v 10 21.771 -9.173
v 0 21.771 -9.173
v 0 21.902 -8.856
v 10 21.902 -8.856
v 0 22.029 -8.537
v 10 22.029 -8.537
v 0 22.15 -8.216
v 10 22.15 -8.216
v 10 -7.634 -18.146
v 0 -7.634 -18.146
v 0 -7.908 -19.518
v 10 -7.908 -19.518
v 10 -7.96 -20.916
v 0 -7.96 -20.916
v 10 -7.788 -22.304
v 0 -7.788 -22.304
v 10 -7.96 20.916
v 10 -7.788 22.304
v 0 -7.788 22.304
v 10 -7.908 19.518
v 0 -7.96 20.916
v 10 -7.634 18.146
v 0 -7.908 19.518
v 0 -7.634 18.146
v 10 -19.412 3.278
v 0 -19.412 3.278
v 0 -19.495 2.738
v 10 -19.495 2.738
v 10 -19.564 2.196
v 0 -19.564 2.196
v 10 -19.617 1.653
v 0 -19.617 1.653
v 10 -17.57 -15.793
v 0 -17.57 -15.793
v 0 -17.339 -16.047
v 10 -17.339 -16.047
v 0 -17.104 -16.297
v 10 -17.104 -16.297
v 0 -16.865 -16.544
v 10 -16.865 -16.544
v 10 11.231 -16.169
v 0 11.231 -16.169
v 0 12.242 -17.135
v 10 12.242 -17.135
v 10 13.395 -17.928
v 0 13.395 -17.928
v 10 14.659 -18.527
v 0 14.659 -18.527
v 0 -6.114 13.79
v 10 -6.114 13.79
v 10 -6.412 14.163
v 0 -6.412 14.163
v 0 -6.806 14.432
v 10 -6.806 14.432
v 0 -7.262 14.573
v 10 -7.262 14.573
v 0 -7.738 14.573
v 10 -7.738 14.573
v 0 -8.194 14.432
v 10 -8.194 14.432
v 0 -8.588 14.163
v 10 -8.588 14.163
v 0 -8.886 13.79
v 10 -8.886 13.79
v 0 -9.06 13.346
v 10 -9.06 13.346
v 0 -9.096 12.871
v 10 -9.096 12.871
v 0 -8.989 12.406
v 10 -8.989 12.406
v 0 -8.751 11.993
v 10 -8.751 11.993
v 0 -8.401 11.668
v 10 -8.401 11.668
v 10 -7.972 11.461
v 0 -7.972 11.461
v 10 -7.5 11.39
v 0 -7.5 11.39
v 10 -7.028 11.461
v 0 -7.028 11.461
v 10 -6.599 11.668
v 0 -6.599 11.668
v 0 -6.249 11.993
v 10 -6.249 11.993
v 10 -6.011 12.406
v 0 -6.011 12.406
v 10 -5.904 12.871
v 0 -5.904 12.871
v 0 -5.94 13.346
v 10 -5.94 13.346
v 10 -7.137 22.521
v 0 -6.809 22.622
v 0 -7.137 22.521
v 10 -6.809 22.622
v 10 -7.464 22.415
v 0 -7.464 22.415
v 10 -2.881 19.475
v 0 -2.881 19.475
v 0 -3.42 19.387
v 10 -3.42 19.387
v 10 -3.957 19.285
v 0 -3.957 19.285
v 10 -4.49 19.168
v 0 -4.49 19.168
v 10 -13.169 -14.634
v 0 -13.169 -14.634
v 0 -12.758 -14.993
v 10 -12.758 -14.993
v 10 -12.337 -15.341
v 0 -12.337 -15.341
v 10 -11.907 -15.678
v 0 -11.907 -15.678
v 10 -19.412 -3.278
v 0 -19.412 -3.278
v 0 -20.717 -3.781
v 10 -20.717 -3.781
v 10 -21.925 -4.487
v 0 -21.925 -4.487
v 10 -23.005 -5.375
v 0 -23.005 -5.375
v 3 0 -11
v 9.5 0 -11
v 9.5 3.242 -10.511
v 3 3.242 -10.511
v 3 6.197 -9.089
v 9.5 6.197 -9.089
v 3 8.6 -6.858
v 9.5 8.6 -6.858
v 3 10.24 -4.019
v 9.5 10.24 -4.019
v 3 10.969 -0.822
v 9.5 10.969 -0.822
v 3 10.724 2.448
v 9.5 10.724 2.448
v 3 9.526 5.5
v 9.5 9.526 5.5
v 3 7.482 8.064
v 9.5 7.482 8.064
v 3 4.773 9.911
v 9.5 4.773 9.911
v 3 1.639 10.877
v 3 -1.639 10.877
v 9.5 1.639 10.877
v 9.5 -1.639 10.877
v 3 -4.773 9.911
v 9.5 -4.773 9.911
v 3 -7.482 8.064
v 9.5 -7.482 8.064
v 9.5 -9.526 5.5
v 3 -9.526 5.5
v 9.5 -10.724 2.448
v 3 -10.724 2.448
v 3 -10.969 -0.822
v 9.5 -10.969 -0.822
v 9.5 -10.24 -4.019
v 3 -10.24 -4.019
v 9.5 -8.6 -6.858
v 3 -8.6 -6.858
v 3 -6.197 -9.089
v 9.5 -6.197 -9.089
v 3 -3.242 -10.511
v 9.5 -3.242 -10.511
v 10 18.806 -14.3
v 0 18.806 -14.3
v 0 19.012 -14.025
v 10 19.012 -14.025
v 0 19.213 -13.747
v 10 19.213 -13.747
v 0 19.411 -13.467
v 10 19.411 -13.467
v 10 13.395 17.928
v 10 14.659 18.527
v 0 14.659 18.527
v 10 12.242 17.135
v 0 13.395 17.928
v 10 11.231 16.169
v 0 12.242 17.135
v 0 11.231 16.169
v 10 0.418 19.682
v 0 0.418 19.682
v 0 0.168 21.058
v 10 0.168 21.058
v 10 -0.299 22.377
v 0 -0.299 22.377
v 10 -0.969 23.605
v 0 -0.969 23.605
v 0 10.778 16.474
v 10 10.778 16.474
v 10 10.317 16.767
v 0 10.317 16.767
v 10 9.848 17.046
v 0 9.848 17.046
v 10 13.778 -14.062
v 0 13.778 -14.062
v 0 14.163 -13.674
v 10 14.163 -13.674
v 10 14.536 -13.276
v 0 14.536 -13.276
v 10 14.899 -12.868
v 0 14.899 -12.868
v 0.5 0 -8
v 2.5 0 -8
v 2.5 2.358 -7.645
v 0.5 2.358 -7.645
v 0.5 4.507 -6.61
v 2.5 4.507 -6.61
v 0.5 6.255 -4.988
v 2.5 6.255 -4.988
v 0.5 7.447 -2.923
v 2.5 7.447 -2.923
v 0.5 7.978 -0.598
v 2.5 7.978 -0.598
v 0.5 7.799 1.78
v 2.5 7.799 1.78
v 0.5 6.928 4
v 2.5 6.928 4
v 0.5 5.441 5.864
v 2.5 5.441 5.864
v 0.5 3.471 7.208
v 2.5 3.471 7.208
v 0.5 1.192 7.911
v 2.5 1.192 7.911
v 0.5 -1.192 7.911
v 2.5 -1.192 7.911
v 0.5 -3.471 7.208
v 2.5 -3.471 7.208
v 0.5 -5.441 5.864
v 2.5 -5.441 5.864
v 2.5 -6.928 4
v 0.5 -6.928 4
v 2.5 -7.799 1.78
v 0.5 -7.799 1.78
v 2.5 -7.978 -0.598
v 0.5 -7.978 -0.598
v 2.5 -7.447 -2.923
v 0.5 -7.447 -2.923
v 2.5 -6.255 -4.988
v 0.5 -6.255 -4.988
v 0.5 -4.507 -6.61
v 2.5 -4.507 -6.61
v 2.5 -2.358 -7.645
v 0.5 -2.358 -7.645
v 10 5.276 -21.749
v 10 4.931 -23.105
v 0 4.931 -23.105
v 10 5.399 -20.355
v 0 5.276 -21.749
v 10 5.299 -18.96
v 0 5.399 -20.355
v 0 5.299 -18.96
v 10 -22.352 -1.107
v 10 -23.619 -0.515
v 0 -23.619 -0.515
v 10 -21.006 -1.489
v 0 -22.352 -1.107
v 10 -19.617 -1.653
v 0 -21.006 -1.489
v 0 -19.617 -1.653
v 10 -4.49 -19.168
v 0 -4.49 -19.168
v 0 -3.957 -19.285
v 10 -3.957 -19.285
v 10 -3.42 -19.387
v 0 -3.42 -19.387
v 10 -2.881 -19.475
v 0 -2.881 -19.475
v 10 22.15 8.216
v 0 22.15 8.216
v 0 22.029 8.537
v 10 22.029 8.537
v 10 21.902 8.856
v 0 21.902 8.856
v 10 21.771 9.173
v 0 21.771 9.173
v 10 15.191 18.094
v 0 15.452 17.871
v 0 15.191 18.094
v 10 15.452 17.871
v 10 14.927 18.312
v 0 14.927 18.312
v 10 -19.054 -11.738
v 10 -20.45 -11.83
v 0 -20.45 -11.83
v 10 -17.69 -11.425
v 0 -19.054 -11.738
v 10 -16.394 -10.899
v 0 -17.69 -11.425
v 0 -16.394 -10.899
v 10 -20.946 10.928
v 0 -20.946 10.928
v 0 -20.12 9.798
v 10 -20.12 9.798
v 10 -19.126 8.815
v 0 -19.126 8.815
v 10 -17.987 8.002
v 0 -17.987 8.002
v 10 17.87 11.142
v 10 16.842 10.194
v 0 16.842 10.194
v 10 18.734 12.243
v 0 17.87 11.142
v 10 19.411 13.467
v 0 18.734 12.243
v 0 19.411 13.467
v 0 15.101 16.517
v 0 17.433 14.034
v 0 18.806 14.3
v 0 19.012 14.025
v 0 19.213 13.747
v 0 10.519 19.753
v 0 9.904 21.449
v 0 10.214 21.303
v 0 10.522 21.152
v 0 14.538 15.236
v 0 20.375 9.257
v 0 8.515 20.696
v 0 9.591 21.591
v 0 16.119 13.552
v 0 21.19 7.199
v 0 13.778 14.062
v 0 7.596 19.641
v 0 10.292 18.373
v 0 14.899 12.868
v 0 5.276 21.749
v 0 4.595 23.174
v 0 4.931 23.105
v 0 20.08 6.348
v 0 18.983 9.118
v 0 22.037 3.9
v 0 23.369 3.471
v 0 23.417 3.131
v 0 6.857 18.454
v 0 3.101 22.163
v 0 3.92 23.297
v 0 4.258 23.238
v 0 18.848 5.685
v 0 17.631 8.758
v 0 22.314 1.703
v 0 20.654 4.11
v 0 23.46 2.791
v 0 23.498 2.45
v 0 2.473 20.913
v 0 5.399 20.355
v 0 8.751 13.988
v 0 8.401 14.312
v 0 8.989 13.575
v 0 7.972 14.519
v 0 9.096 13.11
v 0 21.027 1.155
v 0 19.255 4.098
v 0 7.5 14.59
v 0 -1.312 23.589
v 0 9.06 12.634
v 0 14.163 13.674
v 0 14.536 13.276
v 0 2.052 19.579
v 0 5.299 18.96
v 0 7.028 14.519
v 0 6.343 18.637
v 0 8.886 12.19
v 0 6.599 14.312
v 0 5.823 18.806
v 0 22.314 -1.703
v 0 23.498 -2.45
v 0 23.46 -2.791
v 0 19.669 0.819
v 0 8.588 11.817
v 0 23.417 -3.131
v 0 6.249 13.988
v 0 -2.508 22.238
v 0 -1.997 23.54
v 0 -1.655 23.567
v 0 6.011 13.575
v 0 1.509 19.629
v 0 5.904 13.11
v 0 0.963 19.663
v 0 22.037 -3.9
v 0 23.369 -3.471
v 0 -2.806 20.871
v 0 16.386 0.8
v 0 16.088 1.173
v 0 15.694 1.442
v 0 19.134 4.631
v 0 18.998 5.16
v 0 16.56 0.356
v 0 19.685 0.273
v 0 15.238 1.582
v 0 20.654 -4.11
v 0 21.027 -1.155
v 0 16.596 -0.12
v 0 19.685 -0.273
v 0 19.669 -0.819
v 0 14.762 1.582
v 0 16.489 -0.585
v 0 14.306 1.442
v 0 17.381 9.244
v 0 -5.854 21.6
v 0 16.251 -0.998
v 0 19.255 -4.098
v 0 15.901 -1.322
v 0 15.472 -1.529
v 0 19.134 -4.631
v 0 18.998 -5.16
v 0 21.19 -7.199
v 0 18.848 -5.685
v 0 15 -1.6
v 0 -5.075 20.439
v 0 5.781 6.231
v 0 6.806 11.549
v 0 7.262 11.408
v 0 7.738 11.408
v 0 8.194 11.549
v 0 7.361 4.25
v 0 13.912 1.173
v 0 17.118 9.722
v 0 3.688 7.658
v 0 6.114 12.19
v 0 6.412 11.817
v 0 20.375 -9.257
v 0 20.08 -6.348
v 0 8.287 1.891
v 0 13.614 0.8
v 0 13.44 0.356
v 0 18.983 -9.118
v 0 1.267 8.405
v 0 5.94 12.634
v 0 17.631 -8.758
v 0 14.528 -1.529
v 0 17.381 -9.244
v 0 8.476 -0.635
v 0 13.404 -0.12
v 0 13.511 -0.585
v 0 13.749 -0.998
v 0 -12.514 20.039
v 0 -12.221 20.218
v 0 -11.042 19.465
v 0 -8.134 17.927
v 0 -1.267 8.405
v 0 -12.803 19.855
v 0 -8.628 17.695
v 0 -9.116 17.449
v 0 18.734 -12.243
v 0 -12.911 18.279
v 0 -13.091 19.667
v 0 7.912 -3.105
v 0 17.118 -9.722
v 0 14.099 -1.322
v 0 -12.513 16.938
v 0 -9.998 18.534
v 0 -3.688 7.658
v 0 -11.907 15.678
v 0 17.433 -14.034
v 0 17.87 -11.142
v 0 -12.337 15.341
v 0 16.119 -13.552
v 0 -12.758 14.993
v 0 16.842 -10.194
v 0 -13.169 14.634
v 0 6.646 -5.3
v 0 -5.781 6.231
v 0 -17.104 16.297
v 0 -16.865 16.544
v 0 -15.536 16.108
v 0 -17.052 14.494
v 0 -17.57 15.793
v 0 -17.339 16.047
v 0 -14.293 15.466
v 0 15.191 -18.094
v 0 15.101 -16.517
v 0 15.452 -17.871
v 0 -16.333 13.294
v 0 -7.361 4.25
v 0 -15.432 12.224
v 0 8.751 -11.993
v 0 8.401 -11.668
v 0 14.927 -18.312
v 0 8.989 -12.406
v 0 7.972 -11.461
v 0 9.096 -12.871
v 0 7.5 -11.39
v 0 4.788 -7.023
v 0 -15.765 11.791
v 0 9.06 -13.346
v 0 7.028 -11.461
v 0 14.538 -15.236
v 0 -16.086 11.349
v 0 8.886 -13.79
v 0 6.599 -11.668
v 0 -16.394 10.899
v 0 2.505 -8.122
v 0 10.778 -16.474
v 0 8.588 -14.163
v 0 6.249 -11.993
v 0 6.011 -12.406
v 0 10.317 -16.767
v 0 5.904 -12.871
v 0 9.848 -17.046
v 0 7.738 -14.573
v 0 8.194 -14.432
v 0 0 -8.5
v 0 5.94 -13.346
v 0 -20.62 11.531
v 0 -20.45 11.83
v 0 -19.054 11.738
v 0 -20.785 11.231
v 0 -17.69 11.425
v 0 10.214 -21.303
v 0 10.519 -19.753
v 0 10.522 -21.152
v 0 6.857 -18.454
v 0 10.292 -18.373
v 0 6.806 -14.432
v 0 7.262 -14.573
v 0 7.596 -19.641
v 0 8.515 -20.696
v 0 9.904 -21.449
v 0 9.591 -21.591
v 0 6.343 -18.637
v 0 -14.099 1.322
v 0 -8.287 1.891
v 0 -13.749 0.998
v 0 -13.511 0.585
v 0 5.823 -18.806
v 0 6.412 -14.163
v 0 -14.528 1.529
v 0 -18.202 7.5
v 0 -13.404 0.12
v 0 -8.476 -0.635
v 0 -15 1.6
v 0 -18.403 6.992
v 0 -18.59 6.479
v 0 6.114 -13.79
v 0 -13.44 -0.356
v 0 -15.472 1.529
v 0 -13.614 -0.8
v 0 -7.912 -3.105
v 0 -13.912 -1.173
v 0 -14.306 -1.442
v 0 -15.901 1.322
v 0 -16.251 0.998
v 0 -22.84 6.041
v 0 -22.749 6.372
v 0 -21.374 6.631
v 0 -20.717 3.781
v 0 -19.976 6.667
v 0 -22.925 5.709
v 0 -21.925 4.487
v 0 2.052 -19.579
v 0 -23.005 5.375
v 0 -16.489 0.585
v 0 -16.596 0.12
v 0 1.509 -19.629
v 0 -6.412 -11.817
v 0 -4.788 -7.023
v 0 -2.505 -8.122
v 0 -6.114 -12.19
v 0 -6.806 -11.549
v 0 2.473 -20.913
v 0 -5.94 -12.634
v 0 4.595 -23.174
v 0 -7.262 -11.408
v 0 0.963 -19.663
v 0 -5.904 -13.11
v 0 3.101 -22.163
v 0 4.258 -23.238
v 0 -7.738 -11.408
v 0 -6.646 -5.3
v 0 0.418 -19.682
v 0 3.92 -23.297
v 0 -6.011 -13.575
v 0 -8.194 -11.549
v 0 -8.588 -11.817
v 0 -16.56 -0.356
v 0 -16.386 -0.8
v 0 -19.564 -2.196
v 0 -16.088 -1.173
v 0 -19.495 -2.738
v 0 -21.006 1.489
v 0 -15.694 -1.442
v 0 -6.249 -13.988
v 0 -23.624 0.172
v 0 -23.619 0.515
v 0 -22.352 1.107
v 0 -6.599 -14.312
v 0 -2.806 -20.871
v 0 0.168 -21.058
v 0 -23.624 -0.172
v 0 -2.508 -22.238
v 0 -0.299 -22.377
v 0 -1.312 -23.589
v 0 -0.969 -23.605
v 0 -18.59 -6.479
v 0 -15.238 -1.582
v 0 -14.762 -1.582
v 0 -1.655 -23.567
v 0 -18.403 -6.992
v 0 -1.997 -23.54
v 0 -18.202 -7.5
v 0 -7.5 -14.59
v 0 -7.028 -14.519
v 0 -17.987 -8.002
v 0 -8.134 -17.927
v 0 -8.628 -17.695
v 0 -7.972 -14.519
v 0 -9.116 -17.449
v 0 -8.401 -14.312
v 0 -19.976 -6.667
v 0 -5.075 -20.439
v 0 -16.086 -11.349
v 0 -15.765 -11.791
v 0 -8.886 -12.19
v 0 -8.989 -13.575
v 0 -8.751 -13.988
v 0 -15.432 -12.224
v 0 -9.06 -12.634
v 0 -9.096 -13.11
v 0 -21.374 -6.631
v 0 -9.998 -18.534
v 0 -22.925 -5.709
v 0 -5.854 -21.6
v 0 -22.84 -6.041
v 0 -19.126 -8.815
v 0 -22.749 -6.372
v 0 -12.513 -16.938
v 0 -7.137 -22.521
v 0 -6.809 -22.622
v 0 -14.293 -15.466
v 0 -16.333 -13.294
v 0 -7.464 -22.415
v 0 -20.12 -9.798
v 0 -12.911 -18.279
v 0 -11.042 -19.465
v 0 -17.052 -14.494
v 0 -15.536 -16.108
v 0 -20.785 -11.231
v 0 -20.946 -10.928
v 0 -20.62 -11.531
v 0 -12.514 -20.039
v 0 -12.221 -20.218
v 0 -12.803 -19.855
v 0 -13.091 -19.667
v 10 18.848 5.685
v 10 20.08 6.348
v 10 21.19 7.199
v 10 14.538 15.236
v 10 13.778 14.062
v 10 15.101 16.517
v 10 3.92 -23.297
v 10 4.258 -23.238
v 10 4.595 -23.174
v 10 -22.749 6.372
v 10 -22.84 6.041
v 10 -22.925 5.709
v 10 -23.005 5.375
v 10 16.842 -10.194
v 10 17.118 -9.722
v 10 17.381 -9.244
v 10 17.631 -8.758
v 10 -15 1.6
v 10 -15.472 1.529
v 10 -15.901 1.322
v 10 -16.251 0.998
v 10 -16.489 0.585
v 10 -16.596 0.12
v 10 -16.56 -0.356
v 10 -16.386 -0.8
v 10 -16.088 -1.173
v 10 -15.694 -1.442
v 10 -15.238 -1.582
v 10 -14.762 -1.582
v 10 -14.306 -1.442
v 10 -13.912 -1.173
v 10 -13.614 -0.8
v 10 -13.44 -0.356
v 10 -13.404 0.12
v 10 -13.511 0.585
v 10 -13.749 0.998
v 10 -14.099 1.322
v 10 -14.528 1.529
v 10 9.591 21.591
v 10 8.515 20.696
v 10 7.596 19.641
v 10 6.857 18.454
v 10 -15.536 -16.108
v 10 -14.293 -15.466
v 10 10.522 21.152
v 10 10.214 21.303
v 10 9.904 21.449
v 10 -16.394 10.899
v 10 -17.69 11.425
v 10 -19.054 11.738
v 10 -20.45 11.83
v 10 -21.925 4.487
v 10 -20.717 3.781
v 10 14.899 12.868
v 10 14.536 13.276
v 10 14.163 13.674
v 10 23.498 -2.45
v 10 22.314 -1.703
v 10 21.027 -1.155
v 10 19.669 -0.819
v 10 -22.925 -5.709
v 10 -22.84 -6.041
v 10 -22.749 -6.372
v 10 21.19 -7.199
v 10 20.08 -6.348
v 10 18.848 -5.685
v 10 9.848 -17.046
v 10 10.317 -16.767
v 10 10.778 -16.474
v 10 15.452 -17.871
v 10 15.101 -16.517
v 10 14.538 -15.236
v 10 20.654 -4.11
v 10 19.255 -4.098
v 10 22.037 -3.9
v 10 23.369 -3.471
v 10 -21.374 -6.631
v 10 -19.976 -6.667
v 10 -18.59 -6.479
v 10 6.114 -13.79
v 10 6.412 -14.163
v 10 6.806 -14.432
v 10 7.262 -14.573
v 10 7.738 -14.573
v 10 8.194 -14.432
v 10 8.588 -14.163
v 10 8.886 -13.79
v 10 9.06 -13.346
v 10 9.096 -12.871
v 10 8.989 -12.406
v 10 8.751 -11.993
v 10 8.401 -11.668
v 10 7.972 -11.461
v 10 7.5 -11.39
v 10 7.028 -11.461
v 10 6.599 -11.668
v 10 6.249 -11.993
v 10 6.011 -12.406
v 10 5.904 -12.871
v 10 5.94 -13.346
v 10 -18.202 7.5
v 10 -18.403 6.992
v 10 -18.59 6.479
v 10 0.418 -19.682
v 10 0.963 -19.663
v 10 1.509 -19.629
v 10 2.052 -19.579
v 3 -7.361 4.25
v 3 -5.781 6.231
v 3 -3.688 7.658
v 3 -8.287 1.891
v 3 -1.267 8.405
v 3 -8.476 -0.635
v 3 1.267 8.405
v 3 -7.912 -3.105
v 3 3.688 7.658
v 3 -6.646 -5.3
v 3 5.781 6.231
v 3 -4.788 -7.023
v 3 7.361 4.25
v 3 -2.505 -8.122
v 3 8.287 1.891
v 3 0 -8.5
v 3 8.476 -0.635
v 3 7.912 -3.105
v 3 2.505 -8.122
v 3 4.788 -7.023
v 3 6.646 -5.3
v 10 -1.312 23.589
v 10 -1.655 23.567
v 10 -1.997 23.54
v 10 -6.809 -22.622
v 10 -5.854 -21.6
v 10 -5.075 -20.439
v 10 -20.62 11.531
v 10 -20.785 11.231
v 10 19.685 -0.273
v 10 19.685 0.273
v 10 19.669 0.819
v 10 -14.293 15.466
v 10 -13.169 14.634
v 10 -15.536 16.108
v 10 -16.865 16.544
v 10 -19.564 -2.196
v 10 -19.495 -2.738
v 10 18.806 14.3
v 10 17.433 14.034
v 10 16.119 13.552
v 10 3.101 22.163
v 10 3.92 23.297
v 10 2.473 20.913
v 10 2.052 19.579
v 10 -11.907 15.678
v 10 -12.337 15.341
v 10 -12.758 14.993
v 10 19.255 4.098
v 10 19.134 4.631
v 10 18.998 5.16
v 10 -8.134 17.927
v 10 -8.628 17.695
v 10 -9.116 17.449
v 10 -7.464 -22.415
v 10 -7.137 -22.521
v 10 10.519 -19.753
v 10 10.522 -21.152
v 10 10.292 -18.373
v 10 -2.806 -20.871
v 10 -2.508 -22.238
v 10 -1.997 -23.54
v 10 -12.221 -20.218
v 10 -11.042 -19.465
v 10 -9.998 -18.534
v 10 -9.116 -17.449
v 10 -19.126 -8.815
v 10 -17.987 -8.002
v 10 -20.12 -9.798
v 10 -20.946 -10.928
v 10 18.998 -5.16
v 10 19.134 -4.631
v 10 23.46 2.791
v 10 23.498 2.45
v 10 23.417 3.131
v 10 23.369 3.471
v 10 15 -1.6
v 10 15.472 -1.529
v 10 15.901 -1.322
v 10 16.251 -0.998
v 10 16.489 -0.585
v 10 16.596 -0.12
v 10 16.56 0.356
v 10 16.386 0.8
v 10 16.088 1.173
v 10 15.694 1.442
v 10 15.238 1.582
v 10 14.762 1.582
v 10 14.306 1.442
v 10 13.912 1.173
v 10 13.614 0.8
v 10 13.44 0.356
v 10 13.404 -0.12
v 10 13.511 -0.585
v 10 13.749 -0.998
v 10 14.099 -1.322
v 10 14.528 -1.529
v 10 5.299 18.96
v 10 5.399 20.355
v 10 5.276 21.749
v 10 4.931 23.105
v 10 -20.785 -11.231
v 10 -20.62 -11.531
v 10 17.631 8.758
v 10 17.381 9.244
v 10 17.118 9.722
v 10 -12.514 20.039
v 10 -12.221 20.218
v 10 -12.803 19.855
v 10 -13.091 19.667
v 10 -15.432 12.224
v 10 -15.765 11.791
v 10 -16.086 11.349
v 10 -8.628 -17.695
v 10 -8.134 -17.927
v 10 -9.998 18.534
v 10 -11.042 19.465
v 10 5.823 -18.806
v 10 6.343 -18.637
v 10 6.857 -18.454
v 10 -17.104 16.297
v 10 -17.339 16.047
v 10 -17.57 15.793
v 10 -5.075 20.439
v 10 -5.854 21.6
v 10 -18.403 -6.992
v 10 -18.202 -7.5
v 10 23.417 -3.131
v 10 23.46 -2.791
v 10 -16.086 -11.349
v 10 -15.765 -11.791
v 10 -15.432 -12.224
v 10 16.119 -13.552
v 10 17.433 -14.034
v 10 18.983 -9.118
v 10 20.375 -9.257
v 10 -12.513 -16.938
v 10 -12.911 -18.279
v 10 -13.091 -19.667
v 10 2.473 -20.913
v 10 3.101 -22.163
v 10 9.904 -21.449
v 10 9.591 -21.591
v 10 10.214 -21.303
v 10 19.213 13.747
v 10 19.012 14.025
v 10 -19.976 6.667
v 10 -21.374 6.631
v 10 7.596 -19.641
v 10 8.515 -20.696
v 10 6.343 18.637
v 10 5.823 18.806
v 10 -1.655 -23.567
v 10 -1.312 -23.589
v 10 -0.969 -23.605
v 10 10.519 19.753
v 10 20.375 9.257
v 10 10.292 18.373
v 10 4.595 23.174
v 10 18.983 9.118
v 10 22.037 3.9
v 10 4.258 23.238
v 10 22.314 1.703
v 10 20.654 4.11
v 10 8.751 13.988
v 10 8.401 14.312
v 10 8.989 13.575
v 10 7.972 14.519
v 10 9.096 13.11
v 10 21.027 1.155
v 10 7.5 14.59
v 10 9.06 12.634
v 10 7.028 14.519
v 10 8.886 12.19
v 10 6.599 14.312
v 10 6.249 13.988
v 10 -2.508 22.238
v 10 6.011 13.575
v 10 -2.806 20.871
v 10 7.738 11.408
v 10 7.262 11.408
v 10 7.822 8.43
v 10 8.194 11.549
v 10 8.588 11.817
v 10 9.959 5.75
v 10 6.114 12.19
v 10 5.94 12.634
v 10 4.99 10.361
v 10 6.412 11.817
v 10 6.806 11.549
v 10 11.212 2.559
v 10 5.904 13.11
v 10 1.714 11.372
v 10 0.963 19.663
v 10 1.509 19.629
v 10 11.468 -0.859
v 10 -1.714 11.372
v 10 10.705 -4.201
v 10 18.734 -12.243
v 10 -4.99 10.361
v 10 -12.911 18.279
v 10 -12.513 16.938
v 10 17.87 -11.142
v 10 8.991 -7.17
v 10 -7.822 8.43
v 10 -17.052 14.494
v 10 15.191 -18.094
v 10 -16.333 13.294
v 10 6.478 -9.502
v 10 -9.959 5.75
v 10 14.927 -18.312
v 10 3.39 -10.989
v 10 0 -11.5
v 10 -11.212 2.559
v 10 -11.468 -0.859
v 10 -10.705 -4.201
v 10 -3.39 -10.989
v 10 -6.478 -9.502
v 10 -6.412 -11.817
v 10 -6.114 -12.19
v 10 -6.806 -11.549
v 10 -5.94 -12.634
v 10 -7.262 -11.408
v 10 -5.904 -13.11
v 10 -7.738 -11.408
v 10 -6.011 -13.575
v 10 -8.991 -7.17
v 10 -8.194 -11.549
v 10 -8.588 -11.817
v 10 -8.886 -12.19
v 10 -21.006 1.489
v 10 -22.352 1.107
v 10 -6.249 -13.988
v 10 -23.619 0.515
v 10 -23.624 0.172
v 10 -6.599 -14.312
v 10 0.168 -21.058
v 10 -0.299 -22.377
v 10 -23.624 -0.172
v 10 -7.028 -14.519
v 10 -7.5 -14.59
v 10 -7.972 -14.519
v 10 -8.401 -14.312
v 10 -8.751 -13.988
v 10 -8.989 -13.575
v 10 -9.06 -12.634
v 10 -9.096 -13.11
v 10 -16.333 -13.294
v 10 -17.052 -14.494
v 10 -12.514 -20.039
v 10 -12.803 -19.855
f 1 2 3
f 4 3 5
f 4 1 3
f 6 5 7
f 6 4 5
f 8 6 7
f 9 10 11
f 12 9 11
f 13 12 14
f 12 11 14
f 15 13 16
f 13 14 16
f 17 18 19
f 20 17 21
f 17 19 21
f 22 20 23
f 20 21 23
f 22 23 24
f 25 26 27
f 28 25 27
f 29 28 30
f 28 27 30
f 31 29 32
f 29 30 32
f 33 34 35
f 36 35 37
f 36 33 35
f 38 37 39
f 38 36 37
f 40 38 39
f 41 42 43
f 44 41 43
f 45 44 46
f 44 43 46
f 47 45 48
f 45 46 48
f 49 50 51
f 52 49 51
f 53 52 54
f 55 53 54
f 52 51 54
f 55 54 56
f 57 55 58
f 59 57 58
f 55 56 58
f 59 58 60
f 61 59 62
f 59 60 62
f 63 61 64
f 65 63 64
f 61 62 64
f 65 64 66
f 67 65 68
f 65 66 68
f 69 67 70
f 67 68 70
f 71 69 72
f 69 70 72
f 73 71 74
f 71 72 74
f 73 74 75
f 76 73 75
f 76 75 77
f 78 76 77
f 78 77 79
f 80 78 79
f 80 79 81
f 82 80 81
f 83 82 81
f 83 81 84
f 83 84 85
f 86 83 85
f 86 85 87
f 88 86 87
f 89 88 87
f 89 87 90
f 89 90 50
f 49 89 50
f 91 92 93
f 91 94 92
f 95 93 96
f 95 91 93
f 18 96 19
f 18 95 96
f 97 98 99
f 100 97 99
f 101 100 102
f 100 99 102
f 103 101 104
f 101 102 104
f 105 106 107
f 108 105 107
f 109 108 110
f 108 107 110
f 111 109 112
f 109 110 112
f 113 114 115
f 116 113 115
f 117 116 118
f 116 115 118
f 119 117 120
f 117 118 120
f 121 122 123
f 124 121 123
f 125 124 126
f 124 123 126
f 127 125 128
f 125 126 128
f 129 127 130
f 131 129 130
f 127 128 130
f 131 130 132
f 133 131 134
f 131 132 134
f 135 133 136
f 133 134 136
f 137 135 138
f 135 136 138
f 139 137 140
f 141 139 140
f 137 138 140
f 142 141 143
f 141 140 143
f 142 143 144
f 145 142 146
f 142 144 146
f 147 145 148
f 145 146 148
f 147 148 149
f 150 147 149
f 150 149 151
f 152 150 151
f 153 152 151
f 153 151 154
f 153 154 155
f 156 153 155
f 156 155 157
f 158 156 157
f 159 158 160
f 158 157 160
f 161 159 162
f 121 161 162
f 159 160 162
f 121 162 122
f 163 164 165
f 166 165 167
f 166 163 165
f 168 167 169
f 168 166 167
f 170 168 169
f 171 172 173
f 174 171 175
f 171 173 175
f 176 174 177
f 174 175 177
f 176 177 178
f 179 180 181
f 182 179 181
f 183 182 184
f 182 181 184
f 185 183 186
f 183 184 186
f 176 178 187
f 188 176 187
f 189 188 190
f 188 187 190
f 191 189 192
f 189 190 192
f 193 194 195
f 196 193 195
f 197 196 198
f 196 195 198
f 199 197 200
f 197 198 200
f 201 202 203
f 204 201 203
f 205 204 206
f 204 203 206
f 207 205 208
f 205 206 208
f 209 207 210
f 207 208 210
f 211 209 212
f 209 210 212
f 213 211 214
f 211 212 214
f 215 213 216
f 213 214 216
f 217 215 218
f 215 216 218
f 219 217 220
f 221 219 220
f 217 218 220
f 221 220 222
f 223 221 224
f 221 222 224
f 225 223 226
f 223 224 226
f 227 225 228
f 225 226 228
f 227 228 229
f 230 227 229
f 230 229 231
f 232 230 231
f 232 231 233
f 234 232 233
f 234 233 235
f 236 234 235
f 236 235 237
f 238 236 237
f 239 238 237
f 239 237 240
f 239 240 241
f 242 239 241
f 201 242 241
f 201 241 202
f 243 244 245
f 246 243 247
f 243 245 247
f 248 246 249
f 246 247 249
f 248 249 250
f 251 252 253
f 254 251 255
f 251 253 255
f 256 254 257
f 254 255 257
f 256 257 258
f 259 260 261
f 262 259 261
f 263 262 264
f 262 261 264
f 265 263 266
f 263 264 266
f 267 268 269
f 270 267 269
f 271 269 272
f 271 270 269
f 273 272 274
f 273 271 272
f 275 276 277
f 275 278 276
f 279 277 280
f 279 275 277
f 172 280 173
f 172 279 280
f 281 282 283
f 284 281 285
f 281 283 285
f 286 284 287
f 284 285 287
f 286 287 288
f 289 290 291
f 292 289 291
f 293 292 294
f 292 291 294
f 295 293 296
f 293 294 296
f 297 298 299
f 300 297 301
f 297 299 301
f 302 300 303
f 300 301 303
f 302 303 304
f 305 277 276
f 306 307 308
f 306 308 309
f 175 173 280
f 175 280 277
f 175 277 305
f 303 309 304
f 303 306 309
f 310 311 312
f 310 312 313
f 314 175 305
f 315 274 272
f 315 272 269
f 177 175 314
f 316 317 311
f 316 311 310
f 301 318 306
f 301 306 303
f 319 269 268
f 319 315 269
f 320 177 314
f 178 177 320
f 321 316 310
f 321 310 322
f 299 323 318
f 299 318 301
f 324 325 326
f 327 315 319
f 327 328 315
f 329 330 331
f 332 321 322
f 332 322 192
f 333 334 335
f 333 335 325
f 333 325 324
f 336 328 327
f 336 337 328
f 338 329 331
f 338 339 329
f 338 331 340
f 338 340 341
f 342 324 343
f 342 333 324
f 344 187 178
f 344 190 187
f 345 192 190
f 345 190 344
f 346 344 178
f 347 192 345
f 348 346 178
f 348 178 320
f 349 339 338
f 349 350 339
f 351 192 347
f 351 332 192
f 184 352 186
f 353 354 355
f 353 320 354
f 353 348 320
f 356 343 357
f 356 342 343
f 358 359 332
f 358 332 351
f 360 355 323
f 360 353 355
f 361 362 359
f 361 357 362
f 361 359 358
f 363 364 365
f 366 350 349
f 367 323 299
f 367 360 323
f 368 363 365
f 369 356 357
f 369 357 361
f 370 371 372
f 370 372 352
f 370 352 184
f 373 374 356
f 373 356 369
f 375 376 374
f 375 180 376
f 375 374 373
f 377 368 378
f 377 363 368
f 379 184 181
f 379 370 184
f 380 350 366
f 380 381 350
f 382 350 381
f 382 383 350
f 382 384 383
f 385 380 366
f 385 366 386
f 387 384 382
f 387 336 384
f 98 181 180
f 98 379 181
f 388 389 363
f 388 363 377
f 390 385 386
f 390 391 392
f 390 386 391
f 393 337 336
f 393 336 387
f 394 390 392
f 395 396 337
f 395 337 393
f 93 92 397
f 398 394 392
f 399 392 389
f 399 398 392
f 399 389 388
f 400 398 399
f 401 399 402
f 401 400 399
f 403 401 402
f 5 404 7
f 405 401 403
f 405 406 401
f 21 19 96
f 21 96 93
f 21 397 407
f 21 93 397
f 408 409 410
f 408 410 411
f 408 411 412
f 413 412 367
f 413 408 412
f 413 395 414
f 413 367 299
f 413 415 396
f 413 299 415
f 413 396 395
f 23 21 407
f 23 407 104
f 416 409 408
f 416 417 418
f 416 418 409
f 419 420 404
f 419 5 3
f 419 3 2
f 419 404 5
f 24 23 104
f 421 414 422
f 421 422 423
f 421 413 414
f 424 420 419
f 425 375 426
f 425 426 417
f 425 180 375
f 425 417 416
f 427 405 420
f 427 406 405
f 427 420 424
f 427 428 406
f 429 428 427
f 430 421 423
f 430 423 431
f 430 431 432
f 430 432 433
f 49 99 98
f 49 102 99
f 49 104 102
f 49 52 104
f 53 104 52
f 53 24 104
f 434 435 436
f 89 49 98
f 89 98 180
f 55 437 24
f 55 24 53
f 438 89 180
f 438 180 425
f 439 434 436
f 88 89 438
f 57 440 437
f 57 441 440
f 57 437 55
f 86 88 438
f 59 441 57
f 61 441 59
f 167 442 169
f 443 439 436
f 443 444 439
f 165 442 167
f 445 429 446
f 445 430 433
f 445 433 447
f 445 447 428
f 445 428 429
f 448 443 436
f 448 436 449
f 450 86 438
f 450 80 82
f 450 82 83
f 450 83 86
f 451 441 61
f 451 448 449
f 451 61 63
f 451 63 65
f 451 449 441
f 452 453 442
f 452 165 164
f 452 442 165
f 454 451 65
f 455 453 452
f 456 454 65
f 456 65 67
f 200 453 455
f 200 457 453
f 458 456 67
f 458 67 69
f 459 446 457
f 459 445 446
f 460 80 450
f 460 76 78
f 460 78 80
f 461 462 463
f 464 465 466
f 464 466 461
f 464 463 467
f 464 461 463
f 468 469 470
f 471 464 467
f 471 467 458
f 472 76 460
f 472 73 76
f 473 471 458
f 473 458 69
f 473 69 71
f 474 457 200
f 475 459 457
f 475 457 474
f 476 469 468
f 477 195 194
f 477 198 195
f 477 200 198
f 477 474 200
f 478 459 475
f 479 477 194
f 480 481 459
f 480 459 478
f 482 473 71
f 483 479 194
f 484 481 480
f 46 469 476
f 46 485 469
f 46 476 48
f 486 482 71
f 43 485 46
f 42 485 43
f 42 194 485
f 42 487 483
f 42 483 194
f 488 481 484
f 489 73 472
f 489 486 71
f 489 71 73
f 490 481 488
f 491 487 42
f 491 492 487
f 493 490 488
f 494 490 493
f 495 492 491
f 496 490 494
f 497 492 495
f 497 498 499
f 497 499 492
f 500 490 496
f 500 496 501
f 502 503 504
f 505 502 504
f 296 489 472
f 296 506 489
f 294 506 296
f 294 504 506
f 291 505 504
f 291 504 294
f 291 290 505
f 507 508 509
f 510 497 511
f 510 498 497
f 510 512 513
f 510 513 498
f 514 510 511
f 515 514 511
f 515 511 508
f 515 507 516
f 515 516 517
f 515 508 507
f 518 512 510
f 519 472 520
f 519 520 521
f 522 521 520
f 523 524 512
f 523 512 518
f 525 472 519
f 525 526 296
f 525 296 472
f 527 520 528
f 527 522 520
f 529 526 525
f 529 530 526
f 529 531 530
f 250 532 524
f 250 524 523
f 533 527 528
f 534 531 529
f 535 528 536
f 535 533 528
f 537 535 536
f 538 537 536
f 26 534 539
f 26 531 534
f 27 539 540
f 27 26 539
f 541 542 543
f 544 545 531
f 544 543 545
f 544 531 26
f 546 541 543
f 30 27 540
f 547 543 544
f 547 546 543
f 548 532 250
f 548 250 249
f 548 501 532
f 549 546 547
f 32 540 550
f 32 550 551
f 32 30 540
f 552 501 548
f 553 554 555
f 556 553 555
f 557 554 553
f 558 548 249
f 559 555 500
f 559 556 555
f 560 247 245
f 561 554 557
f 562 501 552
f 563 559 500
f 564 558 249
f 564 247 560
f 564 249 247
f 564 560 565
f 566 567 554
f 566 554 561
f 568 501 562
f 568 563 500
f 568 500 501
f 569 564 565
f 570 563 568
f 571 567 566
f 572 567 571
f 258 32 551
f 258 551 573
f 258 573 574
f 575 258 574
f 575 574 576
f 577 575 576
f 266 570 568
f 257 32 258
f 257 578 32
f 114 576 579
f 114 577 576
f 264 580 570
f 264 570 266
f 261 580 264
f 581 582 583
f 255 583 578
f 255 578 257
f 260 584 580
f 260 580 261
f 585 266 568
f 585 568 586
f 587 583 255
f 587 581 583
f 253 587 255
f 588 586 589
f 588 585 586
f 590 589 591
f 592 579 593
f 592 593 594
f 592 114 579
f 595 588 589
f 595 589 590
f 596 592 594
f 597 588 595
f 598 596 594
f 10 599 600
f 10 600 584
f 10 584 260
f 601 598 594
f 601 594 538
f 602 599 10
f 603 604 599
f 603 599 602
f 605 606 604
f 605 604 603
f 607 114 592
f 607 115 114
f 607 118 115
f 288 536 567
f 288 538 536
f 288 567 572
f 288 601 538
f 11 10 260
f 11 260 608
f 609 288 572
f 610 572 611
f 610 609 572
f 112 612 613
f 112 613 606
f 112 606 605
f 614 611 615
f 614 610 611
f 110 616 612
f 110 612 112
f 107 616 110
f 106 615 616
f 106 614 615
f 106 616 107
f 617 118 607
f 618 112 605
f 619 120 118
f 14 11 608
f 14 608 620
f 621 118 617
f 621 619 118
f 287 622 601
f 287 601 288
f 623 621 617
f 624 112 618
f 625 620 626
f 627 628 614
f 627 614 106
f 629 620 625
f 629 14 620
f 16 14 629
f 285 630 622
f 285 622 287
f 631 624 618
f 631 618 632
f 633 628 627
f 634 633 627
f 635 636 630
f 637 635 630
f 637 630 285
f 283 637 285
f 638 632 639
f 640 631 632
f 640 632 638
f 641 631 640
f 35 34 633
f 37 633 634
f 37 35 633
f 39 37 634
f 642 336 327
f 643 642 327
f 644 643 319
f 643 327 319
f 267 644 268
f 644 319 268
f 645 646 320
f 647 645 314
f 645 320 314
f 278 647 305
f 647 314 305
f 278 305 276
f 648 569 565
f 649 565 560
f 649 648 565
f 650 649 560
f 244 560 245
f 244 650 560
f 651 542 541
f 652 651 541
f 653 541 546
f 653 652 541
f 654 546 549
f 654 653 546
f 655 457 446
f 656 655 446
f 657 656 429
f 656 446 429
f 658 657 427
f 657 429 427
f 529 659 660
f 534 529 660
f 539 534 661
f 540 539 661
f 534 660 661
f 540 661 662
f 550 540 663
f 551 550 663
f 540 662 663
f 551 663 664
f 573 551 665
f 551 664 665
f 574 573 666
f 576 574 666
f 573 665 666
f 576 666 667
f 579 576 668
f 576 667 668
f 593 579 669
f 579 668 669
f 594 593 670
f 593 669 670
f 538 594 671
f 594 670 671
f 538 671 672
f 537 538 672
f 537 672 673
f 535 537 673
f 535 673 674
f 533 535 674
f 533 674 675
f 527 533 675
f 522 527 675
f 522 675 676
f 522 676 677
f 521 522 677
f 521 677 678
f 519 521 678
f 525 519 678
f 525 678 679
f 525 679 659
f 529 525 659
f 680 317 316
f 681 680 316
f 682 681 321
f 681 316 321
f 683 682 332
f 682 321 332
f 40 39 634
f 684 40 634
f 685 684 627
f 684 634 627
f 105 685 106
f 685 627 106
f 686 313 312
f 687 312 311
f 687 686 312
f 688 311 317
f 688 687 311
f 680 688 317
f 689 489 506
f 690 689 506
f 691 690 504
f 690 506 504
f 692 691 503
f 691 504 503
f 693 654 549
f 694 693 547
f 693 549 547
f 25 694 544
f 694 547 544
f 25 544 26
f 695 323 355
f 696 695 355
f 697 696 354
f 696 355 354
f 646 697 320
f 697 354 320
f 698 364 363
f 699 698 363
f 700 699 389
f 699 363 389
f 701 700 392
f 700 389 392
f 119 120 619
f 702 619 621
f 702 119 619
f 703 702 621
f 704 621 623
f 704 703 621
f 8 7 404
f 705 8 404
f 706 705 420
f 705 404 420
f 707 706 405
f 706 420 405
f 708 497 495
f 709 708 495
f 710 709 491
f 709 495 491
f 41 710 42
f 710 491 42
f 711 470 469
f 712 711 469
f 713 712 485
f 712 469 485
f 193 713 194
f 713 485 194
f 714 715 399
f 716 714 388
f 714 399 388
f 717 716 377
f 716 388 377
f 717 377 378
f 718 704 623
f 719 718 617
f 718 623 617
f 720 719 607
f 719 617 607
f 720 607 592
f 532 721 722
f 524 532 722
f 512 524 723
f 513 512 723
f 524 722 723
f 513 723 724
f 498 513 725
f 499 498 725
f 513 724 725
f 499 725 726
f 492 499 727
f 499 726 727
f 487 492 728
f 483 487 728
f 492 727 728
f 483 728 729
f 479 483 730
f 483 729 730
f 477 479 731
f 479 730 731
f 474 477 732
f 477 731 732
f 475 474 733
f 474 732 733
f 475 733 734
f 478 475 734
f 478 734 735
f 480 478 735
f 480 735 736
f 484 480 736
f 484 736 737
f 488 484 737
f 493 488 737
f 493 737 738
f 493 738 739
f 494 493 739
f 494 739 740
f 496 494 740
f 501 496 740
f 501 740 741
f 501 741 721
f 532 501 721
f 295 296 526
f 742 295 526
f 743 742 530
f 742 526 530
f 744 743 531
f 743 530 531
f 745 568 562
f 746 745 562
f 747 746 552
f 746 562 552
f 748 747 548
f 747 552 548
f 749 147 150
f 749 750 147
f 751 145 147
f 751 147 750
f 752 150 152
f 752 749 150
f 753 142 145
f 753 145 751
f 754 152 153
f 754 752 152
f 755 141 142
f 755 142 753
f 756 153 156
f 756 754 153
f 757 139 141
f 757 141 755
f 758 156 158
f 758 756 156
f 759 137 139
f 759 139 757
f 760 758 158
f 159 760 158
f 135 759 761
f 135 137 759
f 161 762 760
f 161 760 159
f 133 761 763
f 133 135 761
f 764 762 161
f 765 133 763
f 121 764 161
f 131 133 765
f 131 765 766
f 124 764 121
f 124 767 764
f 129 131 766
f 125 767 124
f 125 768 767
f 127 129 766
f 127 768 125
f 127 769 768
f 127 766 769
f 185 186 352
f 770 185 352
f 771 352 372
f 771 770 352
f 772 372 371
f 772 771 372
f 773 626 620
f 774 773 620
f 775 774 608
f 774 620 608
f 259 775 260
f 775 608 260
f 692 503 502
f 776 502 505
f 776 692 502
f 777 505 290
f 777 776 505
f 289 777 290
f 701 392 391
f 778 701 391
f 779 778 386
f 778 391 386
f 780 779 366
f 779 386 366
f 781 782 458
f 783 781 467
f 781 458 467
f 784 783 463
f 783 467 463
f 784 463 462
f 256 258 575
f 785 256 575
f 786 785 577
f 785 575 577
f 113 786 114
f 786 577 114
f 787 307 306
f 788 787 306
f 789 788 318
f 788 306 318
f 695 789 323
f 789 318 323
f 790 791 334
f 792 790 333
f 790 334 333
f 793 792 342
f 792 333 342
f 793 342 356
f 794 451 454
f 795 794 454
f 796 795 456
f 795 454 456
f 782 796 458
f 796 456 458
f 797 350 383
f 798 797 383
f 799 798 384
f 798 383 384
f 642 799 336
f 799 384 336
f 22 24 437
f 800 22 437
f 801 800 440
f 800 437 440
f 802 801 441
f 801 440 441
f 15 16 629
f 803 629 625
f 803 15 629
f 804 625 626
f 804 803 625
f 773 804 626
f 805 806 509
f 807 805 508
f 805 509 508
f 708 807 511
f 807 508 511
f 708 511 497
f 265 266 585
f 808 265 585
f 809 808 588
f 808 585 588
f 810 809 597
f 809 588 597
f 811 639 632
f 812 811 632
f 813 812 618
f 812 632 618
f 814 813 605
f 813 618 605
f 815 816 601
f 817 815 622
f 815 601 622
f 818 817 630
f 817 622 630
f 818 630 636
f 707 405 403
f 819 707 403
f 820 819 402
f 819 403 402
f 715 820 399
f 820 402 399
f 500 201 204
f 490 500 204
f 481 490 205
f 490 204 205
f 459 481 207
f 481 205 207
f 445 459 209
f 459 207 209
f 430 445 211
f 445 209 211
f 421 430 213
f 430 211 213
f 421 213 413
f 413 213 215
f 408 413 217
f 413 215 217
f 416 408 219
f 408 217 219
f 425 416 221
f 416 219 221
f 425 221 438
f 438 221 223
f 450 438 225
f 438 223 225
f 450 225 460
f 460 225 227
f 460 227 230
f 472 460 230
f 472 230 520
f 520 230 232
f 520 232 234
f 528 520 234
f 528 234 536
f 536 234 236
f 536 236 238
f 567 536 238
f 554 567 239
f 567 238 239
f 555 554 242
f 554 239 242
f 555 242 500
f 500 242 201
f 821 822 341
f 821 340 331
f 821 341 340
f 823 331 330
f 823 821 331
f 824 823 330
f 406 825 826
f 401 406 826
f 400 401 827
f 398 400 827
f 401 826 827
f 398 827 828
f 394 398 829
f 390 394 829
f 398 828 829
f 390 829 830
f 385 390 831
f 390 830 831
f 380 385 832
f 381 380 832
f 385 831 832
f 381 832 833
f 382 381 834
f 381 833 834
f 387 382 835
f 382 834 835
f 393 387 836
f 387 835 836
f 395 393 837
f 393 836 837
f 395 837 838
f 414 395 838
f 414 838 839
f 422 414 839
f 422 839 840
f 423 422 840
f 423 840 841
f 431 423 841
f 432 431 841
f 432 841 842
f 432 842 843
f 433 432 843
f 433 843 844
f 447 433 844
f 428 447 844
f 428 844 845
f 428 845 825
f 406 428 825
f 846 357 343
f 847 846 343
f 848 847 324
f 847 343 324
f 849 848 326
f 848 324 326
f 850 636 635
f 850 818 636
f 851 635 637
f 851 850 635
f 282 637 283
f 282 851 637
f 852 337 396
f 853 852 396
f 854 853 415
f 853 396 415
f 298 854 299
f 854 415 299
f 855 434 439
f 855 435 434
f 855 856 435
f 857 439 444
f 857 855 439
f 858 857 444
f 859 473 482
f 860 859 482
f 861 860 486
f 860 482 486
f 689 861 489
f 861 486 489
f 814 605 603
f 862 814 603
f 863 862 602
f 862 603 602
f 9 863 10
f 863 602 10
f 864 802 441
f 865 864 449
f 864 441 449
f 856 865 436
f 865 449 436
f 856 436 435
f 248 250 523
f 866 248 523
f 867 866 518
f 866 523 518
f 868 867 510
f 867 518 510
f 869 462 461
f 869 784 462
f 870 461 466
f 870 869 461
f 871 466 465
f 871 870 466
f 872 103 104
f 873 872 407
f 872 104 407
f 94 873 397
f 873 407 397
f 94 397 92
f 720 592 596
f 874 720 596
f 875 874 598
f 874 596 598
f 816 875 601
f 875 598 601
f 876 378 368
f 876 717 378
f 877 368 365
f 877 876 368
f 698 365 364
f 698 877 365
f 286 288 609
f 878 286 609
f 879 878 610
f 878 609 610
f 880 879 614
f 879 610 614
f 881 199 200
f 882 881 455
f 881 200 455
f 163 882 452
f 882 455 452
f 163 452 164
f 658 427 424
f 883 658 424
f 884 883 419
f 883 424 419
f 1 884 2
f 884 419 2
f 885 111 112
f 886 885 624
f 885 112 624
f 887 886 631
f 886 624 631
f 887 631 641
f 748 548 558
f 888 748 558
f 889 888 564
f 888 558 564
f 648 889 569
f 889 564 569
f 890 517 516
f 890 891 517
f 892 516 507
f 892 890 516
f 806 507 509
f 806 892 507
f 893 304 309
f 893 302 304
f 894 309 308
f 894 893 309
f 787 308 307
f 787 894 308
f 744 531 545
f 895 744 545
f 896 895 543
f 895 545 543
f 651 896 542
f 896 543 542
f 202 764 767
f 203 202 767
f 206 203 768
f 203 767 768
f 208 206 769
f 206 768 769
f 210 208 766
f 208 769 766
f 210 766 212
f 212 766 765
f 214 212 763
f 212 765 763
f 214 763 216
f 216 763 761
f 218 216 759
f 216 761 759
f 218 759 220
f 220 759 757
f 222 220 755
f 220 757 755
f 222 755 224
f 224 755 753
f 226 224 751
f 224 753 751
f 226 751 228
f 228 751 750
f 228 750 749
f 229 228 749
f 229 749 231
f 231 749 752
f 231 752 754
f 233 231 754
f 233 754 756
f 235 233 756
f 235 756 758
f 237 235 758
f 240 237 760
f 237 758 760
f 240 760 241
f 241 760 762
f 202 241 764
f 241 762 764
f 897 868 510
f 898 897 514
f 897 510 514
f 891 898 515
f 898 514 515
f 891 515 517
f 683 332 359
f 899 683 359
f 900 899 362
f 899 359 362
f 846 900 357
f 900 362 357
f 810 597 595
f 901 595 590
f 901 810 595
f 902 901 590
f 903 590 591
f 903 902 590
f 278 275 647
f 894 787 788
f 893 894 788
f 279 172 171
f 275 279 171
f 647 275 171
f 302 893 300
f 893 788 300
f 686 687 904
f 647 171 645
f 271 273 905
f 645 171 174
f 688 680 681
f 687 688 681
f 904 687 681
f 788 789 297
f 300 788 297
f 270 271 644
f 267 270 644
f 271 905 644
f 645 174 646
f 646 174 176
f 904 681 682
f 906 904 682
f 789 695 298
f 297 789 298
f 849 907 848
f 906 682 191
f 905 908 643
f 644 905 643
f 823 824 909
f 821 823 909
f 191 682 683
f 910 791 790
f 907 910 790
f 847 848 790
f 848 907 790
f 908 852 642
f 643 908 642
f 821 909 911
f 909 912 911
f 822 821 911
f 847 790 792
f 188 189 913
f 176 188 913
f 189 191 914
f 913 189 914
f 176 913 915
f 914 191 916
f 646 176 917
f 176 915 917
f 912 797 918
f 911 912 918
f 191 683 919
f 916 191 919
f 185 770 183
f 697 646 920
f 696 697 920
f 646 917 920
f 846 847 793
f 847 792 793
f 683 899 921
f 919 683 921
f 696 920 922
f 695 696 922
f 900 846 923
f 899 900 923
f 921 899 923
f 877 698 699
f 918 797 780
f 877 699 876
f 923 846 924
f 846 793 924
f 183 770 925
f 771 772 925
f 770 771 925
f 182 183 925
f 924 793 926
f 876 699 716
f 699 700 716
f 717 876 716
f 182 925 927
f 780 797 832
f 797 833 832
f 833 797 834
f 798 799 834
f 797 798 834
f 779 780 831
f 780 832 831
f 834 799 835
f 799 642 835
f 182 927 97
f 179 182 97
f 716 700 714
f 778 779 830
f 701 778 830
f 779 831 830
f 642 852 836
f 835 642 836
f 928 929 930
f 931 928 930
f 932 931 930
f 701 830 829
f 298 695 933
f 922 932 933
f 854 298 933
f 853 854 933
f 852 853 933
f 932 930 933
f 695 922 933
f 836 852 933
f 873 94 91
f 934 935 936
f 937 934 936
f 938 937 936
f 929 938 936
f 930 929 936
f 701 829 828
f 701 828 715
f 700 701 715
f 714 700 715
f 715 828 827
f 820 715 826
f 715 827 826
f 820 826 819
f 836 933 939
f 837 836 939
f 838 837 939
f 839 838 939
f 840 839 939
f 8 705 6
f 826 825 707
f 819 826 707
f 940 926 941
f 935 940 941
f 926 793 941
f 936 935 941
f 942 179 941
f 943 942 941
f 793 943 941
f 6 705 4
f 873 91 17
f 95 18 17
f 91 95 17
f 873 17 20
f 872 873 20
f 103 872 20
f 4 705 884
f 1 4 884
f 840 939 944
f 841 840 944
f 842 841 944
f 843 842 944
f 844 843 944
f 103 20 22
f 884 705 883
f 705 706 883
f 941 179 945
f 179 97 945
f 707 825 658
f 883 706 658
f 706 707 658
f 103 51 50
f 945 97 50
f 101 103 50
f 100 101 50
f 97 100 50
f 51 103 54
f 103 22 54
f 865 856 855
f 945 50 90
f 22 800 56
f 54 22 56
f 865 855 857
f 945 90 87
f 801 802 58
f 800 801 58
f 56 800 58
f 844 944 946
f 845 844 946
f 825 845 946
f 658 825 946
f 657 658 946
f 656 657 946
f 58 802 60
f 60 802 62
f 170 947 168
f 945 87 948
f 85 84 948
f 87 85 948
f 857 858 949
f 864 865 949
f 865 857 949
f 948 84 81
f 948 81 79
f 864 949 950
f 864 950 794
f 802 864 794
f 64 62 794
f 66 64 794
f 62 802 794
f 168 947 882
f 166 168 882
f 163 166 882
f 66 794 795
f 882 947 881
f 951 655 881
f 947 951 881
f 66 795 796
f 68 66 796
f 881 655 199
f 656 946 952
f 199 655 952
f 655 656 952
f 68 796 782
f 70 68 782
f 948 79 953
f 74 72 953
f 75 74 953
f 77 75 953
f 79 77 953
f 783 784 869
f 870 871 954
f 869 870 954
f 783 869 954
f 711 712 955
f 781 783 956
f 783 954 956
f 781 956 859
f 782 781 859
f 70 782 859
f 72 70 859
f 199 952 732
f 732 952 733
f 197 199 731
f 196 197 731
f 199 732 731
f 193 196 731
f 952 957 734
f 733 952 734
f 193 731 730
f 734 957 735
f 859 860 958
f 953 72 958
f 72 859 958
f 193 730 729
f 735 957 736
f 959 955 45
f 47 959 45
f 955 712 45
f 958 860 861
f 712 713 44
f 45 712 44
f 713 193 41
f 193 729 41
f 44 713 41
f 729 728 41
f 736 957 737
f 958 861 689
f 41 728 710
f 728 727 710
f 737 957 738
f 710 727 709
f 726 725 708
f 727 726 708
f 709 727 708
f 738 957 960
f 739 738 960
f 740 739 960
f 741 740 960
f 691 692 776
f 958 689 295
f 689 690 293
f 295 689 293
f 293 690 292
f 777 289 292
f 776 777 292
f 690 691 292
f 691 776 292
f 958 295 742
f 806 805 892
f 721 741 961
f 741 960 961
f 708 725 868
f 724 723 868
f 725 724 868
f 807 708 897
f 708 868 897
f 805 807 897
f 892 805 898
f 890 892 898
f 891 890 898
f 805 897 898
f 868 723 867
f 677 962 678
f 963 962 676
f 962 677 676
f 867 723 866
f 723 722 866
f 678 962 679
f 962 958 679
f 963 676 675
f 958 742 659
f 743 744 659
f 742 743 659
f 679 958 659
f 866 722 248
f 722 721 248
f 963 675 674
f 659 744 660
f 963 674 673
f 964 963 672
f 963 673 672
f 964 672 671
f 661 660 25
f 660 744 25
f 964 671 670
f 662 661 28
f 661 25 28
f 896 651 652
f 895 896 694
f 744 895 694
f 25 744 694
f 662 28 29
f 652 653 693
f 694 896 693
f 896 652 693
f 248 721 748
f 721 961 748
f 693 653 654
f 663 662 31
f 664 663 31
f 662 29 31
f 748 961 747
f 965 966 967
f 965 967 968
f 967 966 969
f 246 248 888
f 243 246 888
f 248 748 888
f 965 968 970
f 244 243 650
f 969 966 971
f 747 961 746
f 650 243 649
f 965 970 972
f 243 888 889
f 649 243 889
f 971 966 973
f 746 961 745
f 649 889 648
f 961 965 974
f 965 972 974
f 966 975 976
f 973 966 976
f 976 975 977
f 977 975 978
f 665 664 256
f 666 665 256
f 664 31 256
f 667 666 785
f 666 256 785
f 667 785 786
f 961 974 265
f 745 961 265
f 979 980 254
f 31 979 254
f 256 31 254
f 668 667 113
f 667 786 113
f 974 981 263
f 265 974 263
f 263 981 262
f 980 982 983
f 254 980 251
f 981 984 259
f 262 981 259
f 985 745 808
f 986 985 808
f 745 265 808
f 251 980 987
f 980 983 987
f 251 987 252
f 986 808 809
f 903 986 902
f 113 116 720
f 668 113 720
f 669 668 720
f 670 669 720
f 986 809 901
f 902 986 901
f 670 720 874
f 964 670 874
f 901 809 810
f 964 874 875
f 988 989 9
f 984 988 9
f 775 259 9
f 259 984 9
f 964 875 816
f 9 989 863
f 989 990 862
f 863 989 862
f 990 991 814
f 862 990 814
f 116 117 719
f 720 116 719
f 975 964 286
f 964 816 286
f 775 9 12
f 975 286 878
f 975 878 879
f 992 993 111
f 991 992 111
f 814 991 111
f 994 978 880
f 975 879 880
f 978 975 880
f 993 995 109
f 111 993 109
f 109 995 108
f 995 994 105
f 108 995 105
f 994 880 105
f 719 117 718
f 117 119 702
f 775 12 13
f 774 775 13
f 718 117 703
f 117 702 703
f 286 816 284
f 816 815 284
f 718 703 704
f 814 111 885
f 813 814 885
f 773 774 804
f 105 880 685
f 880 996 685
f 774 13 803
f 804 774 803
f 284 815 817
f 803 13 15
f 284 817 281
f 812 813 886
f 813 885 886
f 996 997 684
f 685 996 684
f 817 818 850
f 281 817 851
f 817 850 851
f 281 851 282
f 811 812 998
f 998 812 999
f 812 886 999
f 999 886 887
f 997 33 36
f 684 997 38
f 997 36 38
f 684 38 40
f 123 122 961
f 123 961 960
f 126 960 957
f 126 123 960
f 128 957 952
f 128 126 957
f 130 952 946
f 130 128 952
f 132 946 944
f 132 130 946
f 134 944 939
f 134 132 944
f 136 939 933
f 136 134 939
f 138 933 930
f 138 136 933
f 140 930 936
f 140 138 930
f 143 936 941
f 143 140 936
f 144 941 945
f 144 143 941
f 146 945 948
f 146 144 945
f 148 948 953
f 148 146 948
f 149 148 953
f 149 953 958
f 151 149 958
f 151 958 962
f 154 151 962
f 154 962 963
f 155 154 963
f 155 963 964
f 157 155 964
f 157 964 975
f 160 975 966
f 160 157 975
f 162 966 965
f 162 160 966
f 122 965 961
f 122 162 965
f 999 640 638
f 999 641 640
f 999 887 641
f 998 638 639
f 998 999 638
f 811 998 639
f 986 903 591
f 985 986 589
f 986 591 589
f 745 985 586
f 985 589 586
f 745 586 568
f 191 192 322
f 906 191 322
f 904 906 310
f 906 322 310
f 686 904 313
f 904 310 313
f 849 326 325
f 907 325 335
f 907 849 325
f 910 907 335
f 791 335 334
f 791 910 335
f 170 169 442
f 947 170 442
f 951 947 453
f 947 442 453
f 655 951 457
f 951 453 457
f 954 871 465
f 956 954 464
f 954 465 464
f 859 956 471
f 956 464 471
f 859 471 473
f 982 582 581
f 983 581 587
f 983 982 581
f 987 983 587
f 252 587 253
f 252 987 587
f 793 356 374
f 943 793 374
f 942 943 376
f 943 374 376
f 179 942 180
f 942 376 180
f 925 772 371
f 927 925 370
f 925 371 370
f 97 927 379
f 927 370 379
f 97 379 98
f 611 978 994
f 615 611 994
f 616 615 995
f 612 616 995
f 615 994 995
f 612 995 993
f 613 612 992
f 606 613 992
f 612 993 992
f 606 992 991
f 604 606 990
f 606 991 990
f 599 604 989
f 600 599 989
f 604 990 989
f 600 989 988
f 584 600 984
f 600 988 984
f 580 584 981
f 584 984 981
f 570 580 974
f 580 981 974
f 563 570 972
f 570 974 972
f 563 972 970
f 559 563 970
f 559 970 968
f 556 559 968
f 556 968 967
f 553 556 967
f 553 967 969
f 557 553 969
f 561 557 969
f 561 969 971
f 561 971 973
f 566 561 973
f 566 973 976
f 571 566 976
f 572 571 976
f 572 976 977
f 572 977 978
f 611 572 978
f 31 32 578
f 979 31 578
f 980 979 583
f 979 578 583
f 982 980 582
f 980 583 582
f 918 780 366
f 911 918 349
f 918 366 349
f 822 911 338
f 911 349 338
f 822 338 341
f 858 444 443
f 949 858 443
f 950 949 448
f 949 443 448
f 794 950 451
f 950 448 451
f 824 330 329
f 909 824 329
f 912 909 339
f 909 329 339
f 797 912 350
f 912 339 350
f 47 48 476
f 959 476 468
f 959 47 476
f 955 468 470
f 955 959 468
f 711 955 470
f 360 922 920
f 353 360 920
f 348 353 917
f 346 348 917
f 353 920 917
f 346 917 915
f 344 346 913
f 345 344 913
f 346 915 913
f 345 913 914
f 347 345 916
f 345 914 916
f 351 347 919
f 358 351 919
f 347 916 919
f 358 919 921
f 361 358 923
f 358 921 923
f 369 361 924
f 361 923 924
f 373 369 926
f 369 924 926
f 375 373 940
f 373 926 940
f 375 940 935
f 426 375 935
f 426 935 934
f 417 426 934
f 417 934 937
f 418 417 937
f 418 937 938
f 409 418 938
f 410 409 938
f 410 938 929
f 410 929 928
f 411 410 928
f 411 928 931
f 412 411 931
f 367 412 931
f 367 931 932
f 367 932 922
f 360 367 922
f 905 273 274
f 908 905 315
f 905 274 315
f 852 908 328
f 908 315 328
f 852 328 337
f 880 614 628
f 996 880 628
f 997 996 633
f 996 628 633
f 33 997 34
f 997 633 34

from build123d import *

# Parameters (mm, degrees)
BASPROSKE_W        = 10
BASPROSKE_H        = 23.625
TOOTHCUT_DEPTH     = 35.875224014
TEETHCUTS_COUNT    = 25
TEETHCUTS_ANGLE    = 345.6
BORSKE_R           = 4
BORE_DEPTH         = 50.0000508
SKETCH1_R          = 11
CUT_EXTRUDE1_DEPTH = 7
CUT_EXTRUDE2_REACH = 36.122
SKETCH2_R          = 8
CUT_EXTRUDE3_REACH = 36.862
SKETCH3_R          = 1.6
CIRPATTERN1_COUNT  = 6
CHAMFER1_SIZE      = 0.5


with BuildPart() as part:
    # BasProSke → Base-Revolve (revolve)
    with BuildSketch(Plane(origin=(0, 0, 0), x_dir=(1, 0, 0), z_dir=(0, 1, 0)), mode=Mode.PRIVATE) as base_revolve_sk:
        with Locations((5, 11.8125)):
            Rectangle(BASPROSKE_W, BASPROSKE_H)
    revolve(base_revolve_sk.sketch.rotate(Axis((-10, 0, 0), (1, 0, 0)), 180), axis=Axis((-10, 0, 0), (1, 0, 0)))

    # TooCutSke → ToothCut (cut, through all)
    with BuildSketch(Plane(origin=(0, 0, 0), x_dir=(0, 0, -1), z_dir=(1, 0, 0))):
        with BuildLine():
            ThreePointArc((0.818998709, 19.669456611), (0, 19.6865), (-0.818998709, 19.669456611))
            ThreePointArc((-0.818998709, 19.669456611), (-1.409254574, 21.695516899), (-2.467415344, 23.521336732))
            ThreePointArc((-2.467415344, 23.521336732), (0, 23.6504), (2.467415344, 23.521336732))
            ThreePointArc((2.467415344, 23.521336732), (1.409254574, 21.695516899), (0.818998709, 19.669456611))
        make_face()
    toothcut = extrude(amount=TOOTHCUT_DEPTH, mode=Mode.SUBTRACT)

    # TeethCuts: ToothCut ×25 about axis
    teethcuts_axis = Axis((-10, 0, 0), (1, 0, 0))
    for i in range(1, TEETHCUTS_COUNT):
        add(toothcut.rotate(teethcuts_axis, i * TEETHCUTS_ANGLE / (TEETHCUTS_COUNT - 1)), mode=Mode.SUBTRACT)

    # BorSke → Bore (cut, symmetric)
    with BuildSketch(Plane(origin=(0, 0, 0), x_dir=(0, 0, -1), z_dir=(1, 0, 0))):
        with Locations(Location((0, 0, 0), (0, 0, 180))):
            Circle(BORSKE_R)
    extrude(amount=BORE_DEPTH, both=True, mode=Mode.SUBTRACT)

    # Sketch1 → Cut-Extrude1 (cut)
    with BuildSketch(Plane(origin=(10, 0, 0), x_dir=(0, 0, -1), z_dir=(1, 0, 0))):
        Circle(SKETCH1_R)
    extrude(amount=-CUT_EXTRUDE1_DEPTH, mode=Mode.SUBTRACT)

    # Sketch2 → Cut-Extrude2 (cut, up to next)
    with BuildSketch(Plane(origin=(3, 0, 0), x_dir=(0, 0, -1), z_dir=(1, 0, 0)), mode=Mode.PRIVATE) as cut_extrude2_sk1:
        Circle(SKETCH2_R)
    cut_extrude2_tool1 = extrude(cut_extrude2_sk1.sketch, amount=-CUT_EXTRUDE2_REACH, mode=Mode.PRIVATE) & part.part
    add(cut_extrude2_tool1.solids().sort_by_distance((3, 0, 0))[0], mode=Mode.SUBTRACT)

    # Sketch3 → Cut-Extrude3 (cut, up to next)
    with BuildSketch(Plane(origin=(10, 0, 0), x_dir=(0, 0, -1), z_dir=(1, 0, 0)), mode=Mode.PRIVATE) as cut_extrude3_sk1:
        with Locations((0, 15)):
            Circle(SKETCH3_R)
    cut_extrude3_tool1 = extrude(cut_extrude3_sk1.sketch, amount=-CUT_EXTRUDE3_REACH, mode=Mode.PRIVATE) & part.part
    cut_extrude3 = cut_extrude3_tool1.solids().sort_by_distance((10, 15, 0))[0]
    add(cut_extrude3, mode=Mode.SUBTRACT)

    # CirPattern1: Cut-Extrude3 ×6 about axis
    cirpattern1_axis = Axis((0, 0, 0), (1, 0, 0))
    for i in range(1, CIRPATTERN1_COUNT):
        add(cut_extrude3.rotate(cirpattern1_axis, i * 360 / CIRPATTERN1_COUNT), mode=Mode.SUBTRACT)

    # Chamfer1
    chamfer1_edges = [part.edges().sort_by_distance(p)[0] for p in [
        (10, 0, 11),
        (3, 0, 8),
        (0, 0, 8),
    ]]
    chamfer(chamfer1_edges, length=CHAMFER1_SIZE)


solid = part.part
